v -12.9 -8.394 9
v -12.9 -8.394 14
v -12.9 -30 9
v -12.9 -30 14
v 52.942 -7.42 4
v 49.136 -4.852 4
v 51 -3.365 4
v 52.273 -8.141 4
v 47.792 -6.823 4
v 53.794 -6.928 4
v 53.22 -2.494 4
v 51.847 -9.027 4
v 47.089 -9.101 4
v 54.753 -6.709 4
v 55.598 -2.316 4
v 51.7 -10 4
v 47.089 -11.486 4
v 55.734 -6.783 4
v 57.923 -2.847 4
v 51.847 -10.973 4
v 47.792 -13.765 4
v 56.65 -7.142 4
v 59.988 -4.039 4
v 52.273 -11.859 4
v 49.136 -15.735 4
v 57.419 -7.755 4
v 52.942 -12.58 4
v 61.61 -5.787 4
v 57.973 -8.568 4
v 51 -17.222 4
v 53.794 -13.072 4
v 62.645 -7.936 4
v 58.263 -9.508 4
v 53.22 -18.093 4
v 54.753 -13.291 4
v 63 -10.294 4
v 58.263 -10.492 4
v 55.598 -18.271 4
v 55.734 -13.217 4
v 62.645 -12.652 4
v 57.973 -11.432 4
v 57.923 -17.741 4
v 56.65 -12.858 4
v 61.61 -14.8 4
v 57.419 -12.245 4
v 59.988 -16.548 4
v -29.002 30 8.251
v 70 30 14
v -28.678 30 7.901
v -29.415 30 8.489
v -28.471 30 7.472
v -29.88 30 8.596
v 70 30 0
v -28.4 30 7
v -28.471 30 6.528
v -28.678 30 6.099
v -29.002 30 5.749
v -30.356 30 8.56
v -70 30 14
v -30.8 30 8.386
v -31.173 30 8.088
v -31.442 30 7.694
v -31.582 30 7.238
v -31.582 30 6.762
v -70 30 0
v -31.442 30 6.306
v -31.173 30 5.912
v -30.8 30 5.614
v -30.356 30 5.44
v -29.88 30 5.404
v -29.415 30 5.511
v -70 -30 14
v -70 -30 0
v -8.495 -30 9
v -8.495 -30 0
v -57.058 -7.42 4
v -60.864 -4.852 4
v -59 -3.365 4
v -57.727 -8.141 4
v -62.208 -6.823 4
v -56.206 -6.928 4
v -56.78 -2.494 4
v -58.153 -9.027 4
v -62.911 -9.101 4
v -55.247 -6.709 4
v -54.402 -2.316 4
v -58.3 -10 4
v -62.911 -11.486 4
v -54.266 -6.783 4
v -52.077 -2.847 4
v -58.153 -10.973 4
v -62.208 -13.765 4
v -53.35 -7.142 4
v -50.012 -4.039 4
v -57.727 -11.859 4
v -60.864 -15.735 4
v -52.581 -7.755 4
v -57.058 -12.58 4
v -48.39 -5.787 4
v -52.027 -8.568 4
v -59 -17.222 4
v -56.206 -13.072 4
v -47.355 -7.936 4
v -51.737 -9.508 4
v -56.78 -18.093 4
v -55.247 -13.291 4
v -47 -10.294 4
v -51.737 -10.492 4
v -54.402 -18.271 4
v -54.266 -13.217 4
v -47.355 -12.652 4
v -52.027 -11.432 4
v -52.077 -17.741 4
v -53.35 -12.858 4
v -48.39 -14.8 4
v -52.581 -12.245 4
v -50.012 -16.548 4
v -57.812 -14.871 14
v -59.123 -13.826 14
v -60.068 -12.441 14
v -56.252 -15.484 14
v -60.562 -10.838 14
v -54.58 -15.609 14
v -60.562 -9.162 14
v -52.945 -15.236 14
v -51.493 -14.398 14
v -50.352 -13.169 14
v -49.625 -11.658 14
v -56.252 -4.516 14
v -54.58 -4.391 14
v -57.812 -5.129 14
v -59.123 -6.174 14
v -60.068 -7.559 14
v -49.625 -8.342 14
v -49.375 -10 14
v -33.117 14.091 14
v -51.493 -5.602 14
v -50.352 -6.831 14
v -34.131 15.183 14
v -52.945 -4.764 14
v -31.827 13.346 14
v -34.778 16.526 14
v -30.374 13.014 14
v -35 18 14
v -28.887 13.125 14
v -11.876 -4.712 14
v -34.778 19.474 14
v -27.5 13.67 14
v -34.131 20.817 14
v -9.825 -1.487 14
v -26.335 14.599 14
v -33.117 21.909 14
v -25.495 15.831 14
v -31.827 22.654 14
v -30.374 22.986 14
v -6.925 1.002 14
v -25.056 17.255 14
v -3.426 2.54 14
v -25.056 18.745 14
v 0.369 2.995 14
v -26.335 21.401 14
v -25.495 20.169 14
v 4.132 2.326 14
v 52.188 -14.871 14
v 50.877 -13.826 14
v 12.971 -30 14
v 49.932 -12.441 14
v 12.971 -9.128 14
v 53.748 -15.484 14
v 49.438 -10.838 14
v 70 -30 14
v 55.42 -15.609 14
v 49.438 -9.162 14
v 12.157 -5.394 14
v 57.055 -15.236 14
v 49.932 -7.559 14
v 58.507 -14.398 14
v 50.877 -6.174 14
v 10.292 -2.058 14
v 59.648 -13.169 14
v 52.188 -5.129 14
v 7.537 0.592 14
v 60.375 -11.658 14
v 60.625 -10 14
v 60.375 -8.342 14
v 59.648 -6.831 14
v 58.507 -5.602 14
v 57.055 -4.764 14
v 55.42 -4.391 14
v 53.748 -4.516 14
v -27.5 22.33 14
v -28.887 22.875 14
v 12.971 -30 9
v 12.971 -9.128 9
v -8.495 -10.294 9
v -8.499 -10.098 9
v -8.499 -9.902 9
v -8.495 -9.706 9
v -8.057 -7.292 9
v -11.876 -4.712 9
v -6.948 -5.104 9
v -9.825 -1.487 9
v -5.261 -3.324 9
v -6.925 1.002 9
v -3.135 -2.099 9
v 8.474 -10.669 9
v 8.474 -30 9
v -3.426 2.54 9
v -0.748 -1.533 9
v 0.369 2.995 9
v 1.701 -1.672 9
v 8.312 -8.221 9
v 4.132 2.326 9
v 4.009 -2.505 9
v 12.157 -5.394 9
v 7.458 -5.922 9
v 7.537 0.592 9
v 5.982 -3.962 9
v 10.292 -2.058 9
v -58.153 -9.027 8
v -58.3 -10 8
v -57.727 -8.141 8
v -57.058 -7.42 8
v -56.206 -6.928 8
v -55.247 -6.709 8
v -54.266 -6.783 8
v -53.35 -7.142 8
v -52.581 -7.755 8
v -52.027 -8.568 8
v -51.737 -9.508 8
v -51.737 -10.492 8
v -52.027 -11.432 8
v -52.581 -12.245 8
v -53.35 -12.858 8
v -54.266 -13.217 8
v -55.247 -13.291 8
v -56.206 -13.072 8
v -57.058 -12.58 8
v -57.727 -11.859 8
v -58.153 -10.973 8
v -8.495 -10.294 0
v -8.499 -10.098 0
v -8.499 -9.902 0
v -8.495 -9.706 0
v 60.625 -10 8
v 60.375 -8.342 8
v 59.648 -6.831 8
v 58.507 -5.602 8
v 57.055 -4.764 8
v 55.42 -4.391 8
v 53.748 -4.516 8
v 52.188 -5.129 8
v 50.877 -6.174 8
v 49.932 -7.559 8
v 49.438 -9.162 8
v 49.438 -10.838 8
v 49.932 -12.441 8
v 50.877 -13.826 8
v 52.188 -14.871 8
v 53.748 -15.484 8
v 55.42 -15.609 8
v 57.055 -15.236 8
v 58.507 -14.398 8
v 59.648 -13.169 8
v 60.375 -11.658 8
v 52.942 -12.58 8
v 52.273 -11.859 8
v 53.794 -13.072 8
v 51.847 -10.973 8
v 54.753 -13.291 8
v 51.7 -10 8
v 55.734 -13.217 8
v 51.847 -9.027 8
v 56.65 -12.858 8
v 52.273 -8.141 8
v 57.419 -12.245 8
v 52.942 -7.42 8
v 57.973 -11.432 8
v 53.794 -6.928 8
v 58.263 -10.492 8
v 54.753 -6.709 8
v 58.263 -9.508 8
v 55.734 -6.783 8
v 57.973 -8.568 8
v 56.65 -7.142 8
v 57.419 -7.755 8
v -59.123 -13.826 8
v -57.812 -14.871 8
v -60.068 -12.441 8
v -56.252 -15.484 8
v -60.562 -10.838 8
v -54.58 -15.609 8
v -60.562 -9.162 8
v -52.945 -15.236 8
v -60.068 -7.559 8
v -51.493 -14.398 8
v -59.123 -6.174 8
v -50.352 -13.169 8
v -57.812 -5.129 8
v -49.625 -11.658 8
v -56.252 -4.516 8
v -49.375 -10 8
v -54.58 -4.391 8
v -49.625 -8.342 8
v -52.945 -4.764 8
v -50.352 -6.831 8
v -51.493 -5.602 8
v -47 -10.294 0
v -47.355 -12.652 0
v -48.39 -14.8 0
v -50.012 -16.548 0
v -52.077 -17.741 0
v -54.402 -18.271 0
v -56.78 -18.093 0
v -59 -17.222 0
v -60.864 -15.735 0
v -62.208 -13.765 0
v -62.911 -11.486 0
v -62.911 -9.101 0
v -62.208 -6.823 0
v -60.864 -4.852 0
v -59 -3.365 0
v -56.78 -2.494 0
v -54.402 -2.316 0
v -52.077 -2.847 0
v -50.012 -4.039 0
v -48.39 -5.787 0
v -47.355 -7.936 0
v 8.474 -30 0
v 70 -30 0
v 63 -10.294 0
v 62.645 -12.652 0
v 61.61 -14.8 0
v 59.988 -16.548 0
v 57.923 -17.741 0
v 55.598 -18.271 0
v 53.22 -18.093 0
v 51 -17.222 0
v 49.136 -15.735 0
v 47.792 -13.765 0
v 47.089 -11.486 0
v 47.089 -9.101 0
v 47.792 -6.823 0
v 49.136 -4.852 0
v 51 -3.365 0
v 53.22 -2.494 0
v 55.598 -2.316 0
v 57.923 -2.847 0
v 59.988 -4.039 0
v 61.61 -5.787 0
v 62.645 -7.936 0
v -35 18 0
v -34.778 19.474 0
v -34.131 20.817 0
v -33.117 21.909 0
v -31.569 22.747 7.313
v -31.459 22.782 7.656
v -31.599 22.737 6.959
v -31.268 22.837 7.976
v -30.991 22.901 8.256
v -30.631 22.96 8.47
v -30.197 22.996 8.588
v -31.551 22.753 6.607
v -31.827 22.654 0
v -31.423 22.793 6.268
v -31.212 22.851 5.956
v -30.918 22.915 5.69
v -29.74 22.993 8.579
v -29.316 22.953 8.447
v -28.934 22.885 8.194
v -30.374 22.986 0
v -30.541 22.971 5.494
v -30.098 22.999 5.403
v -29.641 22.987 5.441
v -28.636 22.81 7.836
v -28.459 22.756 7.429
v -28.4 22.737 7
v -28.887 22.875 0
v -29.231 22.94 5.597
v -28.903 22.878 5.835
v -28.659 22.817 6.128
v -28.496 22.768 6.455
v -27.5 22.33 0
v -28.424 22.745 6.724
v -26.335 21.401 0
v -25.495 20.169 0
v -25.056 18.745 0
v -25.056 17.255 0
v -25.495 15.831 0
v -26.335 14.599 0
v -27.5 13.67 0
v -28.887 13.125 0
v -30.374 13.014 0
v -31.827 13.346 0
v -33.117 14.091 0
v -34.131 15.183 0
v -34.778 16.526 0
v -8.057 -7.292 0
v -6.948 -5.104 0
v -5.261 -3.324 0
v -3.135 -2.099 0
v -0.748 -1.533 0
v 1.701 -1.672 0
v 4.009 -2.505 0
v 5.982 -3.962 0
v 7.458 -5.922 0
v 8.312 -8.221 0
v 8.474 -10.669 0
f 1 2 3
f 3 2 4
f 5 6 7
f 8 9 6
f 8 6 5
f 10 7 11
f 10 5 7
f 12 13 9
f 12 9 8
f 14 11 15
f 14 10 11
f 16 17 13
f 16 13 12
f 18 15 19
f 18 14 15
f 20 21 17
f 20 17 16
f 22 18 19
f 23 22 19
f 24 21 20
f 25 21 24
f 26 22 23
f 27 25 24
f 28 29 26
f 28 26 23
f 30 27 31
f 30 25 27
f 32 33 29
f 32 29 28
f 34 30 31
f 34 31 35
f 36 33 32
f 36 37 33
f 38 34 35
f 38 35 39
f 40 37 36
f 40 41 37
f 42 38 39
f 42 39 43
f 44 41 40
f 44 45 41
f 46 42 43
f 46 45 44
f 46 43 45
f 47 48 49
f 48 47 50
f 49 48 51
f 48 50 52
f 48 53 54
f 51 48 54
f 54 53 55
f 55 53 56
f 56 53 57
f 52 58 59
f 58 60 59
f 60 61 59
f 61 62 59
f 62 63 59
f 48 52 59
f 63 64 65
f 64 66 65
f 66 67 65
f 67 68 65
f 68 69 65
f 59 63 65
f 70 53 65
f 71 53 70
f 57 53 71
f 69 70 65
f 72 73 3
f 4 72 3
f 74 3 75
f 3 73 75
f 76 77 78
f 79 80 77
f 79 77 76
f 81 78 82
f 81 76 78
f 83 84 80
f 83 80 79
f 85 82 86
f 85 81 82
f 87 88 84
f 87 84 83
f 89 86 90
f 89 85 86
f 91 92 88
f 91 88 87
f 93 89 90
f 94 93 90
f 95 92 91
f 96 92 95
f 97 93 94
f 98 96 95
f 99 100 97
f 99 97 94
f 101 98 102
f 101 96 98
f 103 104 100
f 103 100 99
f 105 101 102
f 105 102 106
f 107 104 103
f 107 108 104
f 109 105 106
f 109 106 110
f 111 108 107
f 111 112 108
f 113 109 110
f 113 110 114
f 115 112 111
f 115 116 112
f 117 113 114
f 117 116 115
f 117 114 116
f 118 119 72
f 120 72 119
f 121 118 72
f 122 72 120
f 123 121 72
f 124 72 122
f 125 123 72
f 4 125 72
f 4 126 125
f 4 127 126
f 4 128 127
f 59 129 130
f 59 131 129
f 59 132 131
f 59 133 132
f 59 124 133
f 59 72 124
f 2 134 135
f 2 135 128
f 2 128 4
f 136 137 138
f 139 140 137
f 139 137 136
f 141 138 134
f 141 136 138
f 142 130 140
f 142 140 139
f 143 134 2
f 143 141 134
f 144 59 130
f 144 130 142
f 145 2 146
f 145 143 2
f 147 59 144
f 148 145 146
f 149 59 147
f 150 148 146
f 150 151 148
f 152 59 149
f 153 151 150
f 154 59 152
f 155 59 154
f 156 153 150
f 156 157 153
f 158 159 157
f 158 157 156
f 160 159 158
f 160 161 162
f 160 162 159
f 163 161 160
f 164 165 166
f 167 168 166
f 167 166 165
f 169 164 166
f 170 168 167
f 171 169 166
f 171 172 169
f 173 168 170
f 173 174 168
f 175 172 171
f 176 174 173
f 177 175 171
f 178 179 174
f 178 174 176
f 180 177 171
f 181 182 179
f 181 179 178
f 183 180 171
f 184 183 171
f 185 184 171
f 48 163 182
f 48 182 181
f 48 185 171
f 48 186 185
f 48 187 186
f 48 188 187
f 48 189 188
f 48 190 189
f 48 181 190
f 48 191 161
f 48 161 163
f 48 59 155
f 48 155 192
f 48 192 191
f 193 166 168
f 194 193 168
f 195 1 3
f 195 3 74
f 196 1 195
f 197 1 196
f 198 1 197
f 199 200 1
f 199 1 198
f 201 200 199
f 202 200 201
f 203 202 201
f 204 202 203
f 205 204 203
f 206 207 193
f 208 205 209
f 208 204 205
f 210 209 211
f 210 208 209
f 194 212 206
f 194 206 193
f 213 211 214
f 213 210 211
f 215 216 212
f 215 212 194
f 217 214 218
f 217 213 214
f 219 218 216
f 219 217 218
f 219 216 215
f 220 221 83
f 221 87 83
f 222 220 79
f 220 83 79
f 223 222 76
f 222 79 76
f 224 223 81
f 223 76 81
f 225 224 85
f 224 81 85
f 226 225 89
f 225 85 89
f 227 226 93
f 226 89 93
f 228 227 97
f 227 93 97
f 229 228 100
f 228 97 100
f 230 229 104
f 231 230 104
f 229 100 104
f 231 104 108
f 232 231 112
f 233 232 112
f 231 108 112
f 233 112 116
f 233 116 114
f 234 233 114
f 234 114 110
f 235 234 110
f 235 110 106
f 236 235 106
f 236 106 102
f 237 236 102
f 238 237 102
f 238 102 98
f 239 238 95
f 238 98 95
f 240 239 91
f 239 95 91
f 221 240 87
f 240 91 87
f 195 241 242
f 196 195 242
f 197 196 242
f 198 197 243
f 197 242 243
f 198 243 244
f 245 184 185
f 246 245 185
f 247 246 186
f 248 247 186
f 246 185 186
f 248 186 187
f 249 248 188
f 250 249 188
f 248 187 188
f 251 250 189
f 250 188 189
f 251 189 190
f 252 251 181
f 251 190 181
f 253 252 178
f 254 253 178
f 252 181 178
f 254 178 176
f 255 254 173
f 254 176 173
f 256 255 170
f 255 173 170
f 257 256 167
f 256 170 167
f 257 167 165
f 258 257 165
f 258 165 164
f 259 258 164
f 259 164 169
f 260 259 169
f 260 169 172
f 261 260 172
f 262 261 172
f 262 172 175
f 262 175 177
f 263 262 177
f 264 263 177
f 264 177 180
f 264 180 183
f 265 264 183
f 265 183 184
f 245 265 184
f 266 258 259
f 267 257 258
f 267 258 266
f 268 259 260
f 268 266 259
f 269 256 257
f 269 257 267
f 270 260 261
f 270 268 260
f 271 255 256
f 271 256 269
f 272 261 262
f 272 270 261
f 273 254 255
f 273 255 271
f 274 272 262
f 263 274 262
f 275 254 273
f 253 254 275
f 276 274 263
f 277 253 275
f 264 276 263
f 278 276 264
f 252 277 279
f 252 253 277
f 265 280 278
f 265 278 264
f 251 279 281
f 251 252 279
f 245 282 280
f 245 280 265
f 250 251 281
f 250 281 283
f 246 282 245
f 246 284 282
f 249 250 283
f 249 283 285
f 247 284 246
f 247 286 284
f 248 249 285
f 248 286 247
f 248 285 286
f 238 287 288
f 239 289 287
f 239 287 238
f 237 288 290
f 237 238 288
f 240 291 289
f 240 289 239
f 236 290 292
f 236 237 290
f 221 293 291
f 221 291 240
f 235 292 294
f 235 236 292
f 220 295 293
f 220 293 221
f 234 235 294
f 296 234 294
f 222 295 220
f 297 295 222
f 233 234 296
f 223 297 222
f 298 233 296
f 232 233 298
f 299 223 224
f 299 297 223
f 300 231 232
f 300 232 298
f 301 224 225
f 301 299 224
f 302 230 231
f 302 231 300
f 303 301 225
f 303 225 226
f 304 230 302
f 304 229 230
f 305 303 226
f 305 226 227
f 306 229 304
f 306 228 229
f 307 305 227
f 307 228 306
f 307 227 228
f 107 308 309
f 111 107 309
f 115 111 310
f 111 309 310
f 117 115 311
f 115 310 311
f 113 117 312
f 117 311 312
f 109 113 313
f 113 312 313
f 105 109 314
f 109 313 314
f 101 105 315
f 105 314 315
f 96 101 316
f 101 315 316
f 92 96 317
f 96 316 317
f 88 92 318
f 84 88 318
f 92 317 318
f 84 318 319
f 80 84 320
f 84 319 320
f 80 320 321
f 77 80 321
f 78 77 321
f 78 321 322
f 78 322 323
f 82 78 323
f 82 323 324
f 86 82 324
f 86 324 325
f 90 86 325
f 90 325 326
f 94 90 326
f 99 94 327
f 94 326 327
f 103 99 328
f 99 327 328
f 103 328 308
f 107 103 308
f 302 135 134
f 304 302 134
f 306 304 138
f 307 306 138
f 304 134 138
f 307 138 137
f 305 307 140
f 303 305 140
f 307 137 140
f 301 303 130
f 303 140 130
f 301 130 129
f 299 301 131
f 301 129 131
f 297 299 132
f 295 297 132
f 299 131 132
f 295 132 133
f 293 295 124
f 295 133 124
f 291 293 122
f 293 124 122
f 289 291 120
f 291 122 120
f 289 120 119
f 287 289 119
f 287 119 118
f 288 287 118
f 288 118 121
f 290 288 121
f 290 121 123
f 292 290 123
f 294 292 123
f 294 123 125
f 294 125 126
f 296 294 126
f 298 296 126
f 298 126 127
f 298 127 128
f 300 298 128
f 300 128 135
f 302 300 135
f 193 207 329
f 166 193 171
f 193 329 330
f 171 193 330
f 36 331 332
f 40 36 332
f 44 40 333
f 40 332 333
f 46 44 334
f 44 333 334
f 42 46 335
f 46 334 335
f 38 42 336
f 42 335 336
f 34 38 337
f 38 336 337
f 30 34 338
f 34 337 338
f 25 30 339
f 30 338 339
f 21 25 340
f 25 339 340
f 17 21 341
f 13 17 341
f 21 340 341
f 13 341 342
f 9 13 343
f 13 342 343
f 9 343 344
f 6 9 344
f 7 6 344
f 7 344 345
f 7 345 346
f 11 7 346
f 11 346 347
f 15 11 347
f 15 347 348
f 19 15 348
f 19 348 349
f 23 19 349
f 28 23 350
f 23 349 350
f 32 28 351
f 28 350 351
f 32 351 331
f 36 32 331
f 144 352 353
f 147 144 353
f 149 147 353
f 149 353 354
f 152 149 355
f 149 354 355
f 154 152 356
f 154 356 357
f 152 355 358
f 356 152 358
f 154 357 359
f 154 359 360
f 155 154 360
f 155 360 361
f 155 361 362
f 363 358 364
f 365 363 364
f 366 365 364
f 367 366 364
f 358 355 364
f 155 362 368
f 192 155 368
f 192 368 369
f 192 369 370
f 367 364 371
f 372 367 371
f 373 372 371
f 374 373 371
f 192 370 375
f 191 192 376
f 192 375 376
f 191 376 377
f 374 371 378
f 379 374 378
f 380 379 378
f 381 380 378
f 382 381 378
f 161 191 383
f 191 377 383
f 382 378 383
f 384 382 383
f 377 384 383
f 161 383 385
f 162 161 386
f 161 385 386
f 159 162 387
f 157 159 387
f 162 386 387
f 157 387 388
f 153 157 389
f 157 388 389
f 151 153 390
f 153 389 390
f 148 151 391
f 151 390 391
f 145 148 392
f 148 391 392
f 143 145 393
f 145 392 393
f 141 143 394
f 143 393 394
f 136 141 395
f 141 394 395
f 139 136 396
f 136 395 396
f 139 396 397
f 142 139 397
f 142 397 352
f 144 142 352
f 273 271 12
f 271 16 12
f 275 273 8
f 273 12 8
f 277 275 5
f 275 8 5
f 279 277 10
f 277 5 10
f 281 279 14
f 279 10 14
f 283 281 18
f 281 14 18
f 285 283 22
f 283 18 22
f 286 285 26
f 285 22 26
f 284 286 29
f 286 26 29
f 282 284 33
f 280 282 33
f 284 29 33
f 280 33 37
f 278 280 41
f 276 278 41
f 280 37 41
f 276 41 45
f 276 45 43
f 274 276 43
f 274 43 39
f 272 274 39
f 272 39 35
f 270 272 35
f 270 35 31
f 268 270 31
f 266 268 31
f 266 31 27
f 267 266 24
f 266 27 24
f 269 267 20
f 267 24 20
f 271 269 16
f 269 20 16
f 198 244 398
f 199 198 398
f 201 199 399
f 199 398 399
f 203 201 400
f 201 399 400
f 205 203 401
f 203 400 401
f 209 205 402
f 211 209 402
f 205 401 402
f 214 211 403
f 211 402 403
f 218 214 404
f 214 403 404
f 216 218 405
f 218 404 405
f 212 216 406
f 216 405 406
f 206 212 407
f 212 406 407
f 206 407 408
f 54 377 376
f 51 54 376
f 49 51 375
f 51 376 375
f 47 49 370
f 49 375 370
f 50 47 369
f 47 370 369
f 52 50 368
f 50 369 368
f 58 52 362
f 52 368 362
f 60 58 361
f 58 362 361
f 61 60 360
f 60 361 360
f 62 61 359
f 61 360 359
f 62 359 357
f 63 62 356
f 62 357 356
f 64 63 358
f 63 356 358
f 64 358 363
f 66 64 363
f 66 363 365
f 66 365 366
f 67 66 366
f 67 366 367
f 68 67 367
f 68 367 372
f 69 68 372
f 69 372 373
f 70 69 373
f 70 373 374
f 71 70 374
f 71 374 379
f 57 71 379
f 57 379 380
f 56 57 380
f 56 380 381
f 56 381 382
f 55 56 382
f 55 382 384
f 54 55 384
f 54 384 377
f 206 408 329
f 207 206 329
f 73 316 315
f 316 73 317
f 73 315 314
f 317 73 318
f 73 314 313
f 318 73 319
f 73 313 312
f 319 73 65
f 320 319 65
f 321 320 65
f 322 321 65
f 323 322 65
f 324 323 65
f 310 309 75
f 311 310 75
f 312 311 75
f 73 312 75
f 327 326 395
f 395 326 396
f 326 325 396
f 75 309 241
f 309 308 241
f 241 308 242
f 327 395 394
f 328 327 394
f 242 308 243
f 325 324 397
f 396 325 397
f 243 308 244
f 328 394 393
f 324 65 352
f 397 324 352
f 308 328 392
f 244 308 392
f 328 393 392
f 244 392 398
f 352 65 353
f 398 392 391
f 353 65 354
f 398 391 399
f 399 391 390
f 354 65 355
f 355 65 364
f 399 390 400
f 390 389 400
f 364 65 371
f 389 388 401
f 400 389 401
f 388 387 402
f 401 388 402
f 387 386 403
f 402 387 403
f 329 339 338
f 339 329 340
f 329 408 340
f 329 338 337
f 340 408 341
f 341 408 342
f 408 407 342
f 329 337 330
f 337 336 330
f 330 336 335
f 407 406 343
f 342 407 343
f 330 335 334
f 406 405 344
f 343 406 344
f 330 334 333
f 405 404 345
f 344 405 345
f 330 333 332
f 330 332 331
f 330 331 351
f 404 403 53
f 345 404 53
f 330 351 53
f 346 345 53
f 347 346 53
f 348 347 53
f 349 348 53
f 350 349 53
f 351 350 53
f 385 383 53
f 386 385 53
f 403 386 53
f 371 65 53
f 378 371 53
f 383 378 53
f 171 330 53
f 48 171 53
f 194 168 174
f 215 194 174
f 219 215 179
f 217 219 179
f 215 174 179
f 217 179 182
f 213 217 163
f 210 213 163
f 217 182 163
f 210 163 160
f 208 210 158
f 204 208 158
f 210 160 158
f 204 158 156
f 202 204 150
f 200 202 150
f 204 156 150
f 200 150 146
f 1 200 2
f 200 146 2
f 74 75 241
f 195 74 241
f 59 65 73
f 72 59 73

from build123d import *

# Parameters (mm, degrees)
F1_DEPTH       = 14
F3_DEPTH       = 5
F5_D           = 10
F6_R           = 8
F7_DEPTH       = 4
F9_D           = 6.6
F9_CBORE_D     = 11.25
F9_CBORE_DEPTH = 6
F11_D          = 3.2
F11_DEPTH      = 9
F11_TIP        = 0.9613769904


with BuildPart() as f1:
    # F0 (on Top) → F1 (new body)
    with BuildSketch(Plane.XY):
        with BuildLine():
            Line((8.4736176887, -30), (70, -30))
            Line((70, -30), (70, 30))
            Line((70, 30), (-70, 30))
            Line((-70, 30), (-70, -30))
            Line((-70, -30), (-8.4949249349, -30))
            Line((-8.4949249349, -30), (-8.4949249349, -10.2936840984))
            ThreePointArc((-8.4949249349, -10.2936840984), (-8.5, -10), (-8.4949249349, -9.7063159016))
            ThreePointArc((-8.4949249349, -9.7063159016), (0.4815504321, -1.5136515991), (8.4736176887, -10.6691810406))
            Line((8.4736176887, -10.6691810406), (8.4736176887, -30))
        make_face()
    extrude(amount=F1_DEPTH)

    # F2 (on face) → F3 (cut)
    with BuildSketch(Plane.XY.offset(14)):
        with BuildLine():
            Line((12.9707033085, -30), (12.9707033085, -10.8722704179))
            Line((12.9707033085, -10.8722704179), (12.9707033085, -9.1277295821))
            ThreePointArc((12.9707033085, -9.1277295821), (0.3687690423, 2.9947685394), (-12.900361613, -8.3935535324))
            Line((-12.900361613, -8.3935535324), (-12.900361613, -11.6064464676))
            Line((-12.900361613, -11.6064464676), (-12.900361613, -30))
            Line((-12.900361613, -30), (-8.4949249349, -30))
            Line((-8.4949249349, -30), (-8.4949249349, -10.2936840984))
            ThreePointArc((-8.4949249349, -10.2936840984), (0.1880504934, -1.5020804304), (8.4736176887, -10.6691810406))
            Line((8.4736176887, -10.6691810406), (8.4736176887, -30))
            Line((8.4736176887, -30), (12.9707033085, -30))
        make_face()
    extrude(amount=-F3_DEPTH, mode=Mode.SUBTRACT)

    # F5 (through all)
    with Locations(Plane.XY.offset(14)):
        with Locations((-30, 18)):
            Hole(F5_D / 2)

    # F6 (on face) → F7 (cut)
    with BuildSketch(Plane(origin=(0, 0, 0), x_dir=(1, 0, 0), z_dir=(0, 0, -1))):
        with Locations((-55, 10.2936840984)):
            Circle(F6_R)
        with Locations((55, 10.2936840984)):
            Circle(F6_R)
    extrude(amount=-F7_DEPTH, mode=Mode.SUBTRACT)

    # F9 (through all)
    with Locations(Plane.XY.offset(14)):
        with Locations((-55, -10), (55, -10)):
            CounterBoreHole(F9_D / 2, F9_CBORE_D / 2, F9_CBORE_DEPTH)

    # F11
    with Locations(Plane(origin=(0, 30, 0), x_dir=(-1, 0, 0), z_dir=(0, 1, 0))):
        with Locations((30, 7)):
            Hole(F11_D / 2, depth=F11_DEPTH)
            with Locations((0, 0, -(F11_DEPTH + F11_TIP / 2))):  # 118° drill point
                Cone(0, F11_D / 2, F11_TIP, mode=Mode.SUBTRACT)


solid = f1.part
